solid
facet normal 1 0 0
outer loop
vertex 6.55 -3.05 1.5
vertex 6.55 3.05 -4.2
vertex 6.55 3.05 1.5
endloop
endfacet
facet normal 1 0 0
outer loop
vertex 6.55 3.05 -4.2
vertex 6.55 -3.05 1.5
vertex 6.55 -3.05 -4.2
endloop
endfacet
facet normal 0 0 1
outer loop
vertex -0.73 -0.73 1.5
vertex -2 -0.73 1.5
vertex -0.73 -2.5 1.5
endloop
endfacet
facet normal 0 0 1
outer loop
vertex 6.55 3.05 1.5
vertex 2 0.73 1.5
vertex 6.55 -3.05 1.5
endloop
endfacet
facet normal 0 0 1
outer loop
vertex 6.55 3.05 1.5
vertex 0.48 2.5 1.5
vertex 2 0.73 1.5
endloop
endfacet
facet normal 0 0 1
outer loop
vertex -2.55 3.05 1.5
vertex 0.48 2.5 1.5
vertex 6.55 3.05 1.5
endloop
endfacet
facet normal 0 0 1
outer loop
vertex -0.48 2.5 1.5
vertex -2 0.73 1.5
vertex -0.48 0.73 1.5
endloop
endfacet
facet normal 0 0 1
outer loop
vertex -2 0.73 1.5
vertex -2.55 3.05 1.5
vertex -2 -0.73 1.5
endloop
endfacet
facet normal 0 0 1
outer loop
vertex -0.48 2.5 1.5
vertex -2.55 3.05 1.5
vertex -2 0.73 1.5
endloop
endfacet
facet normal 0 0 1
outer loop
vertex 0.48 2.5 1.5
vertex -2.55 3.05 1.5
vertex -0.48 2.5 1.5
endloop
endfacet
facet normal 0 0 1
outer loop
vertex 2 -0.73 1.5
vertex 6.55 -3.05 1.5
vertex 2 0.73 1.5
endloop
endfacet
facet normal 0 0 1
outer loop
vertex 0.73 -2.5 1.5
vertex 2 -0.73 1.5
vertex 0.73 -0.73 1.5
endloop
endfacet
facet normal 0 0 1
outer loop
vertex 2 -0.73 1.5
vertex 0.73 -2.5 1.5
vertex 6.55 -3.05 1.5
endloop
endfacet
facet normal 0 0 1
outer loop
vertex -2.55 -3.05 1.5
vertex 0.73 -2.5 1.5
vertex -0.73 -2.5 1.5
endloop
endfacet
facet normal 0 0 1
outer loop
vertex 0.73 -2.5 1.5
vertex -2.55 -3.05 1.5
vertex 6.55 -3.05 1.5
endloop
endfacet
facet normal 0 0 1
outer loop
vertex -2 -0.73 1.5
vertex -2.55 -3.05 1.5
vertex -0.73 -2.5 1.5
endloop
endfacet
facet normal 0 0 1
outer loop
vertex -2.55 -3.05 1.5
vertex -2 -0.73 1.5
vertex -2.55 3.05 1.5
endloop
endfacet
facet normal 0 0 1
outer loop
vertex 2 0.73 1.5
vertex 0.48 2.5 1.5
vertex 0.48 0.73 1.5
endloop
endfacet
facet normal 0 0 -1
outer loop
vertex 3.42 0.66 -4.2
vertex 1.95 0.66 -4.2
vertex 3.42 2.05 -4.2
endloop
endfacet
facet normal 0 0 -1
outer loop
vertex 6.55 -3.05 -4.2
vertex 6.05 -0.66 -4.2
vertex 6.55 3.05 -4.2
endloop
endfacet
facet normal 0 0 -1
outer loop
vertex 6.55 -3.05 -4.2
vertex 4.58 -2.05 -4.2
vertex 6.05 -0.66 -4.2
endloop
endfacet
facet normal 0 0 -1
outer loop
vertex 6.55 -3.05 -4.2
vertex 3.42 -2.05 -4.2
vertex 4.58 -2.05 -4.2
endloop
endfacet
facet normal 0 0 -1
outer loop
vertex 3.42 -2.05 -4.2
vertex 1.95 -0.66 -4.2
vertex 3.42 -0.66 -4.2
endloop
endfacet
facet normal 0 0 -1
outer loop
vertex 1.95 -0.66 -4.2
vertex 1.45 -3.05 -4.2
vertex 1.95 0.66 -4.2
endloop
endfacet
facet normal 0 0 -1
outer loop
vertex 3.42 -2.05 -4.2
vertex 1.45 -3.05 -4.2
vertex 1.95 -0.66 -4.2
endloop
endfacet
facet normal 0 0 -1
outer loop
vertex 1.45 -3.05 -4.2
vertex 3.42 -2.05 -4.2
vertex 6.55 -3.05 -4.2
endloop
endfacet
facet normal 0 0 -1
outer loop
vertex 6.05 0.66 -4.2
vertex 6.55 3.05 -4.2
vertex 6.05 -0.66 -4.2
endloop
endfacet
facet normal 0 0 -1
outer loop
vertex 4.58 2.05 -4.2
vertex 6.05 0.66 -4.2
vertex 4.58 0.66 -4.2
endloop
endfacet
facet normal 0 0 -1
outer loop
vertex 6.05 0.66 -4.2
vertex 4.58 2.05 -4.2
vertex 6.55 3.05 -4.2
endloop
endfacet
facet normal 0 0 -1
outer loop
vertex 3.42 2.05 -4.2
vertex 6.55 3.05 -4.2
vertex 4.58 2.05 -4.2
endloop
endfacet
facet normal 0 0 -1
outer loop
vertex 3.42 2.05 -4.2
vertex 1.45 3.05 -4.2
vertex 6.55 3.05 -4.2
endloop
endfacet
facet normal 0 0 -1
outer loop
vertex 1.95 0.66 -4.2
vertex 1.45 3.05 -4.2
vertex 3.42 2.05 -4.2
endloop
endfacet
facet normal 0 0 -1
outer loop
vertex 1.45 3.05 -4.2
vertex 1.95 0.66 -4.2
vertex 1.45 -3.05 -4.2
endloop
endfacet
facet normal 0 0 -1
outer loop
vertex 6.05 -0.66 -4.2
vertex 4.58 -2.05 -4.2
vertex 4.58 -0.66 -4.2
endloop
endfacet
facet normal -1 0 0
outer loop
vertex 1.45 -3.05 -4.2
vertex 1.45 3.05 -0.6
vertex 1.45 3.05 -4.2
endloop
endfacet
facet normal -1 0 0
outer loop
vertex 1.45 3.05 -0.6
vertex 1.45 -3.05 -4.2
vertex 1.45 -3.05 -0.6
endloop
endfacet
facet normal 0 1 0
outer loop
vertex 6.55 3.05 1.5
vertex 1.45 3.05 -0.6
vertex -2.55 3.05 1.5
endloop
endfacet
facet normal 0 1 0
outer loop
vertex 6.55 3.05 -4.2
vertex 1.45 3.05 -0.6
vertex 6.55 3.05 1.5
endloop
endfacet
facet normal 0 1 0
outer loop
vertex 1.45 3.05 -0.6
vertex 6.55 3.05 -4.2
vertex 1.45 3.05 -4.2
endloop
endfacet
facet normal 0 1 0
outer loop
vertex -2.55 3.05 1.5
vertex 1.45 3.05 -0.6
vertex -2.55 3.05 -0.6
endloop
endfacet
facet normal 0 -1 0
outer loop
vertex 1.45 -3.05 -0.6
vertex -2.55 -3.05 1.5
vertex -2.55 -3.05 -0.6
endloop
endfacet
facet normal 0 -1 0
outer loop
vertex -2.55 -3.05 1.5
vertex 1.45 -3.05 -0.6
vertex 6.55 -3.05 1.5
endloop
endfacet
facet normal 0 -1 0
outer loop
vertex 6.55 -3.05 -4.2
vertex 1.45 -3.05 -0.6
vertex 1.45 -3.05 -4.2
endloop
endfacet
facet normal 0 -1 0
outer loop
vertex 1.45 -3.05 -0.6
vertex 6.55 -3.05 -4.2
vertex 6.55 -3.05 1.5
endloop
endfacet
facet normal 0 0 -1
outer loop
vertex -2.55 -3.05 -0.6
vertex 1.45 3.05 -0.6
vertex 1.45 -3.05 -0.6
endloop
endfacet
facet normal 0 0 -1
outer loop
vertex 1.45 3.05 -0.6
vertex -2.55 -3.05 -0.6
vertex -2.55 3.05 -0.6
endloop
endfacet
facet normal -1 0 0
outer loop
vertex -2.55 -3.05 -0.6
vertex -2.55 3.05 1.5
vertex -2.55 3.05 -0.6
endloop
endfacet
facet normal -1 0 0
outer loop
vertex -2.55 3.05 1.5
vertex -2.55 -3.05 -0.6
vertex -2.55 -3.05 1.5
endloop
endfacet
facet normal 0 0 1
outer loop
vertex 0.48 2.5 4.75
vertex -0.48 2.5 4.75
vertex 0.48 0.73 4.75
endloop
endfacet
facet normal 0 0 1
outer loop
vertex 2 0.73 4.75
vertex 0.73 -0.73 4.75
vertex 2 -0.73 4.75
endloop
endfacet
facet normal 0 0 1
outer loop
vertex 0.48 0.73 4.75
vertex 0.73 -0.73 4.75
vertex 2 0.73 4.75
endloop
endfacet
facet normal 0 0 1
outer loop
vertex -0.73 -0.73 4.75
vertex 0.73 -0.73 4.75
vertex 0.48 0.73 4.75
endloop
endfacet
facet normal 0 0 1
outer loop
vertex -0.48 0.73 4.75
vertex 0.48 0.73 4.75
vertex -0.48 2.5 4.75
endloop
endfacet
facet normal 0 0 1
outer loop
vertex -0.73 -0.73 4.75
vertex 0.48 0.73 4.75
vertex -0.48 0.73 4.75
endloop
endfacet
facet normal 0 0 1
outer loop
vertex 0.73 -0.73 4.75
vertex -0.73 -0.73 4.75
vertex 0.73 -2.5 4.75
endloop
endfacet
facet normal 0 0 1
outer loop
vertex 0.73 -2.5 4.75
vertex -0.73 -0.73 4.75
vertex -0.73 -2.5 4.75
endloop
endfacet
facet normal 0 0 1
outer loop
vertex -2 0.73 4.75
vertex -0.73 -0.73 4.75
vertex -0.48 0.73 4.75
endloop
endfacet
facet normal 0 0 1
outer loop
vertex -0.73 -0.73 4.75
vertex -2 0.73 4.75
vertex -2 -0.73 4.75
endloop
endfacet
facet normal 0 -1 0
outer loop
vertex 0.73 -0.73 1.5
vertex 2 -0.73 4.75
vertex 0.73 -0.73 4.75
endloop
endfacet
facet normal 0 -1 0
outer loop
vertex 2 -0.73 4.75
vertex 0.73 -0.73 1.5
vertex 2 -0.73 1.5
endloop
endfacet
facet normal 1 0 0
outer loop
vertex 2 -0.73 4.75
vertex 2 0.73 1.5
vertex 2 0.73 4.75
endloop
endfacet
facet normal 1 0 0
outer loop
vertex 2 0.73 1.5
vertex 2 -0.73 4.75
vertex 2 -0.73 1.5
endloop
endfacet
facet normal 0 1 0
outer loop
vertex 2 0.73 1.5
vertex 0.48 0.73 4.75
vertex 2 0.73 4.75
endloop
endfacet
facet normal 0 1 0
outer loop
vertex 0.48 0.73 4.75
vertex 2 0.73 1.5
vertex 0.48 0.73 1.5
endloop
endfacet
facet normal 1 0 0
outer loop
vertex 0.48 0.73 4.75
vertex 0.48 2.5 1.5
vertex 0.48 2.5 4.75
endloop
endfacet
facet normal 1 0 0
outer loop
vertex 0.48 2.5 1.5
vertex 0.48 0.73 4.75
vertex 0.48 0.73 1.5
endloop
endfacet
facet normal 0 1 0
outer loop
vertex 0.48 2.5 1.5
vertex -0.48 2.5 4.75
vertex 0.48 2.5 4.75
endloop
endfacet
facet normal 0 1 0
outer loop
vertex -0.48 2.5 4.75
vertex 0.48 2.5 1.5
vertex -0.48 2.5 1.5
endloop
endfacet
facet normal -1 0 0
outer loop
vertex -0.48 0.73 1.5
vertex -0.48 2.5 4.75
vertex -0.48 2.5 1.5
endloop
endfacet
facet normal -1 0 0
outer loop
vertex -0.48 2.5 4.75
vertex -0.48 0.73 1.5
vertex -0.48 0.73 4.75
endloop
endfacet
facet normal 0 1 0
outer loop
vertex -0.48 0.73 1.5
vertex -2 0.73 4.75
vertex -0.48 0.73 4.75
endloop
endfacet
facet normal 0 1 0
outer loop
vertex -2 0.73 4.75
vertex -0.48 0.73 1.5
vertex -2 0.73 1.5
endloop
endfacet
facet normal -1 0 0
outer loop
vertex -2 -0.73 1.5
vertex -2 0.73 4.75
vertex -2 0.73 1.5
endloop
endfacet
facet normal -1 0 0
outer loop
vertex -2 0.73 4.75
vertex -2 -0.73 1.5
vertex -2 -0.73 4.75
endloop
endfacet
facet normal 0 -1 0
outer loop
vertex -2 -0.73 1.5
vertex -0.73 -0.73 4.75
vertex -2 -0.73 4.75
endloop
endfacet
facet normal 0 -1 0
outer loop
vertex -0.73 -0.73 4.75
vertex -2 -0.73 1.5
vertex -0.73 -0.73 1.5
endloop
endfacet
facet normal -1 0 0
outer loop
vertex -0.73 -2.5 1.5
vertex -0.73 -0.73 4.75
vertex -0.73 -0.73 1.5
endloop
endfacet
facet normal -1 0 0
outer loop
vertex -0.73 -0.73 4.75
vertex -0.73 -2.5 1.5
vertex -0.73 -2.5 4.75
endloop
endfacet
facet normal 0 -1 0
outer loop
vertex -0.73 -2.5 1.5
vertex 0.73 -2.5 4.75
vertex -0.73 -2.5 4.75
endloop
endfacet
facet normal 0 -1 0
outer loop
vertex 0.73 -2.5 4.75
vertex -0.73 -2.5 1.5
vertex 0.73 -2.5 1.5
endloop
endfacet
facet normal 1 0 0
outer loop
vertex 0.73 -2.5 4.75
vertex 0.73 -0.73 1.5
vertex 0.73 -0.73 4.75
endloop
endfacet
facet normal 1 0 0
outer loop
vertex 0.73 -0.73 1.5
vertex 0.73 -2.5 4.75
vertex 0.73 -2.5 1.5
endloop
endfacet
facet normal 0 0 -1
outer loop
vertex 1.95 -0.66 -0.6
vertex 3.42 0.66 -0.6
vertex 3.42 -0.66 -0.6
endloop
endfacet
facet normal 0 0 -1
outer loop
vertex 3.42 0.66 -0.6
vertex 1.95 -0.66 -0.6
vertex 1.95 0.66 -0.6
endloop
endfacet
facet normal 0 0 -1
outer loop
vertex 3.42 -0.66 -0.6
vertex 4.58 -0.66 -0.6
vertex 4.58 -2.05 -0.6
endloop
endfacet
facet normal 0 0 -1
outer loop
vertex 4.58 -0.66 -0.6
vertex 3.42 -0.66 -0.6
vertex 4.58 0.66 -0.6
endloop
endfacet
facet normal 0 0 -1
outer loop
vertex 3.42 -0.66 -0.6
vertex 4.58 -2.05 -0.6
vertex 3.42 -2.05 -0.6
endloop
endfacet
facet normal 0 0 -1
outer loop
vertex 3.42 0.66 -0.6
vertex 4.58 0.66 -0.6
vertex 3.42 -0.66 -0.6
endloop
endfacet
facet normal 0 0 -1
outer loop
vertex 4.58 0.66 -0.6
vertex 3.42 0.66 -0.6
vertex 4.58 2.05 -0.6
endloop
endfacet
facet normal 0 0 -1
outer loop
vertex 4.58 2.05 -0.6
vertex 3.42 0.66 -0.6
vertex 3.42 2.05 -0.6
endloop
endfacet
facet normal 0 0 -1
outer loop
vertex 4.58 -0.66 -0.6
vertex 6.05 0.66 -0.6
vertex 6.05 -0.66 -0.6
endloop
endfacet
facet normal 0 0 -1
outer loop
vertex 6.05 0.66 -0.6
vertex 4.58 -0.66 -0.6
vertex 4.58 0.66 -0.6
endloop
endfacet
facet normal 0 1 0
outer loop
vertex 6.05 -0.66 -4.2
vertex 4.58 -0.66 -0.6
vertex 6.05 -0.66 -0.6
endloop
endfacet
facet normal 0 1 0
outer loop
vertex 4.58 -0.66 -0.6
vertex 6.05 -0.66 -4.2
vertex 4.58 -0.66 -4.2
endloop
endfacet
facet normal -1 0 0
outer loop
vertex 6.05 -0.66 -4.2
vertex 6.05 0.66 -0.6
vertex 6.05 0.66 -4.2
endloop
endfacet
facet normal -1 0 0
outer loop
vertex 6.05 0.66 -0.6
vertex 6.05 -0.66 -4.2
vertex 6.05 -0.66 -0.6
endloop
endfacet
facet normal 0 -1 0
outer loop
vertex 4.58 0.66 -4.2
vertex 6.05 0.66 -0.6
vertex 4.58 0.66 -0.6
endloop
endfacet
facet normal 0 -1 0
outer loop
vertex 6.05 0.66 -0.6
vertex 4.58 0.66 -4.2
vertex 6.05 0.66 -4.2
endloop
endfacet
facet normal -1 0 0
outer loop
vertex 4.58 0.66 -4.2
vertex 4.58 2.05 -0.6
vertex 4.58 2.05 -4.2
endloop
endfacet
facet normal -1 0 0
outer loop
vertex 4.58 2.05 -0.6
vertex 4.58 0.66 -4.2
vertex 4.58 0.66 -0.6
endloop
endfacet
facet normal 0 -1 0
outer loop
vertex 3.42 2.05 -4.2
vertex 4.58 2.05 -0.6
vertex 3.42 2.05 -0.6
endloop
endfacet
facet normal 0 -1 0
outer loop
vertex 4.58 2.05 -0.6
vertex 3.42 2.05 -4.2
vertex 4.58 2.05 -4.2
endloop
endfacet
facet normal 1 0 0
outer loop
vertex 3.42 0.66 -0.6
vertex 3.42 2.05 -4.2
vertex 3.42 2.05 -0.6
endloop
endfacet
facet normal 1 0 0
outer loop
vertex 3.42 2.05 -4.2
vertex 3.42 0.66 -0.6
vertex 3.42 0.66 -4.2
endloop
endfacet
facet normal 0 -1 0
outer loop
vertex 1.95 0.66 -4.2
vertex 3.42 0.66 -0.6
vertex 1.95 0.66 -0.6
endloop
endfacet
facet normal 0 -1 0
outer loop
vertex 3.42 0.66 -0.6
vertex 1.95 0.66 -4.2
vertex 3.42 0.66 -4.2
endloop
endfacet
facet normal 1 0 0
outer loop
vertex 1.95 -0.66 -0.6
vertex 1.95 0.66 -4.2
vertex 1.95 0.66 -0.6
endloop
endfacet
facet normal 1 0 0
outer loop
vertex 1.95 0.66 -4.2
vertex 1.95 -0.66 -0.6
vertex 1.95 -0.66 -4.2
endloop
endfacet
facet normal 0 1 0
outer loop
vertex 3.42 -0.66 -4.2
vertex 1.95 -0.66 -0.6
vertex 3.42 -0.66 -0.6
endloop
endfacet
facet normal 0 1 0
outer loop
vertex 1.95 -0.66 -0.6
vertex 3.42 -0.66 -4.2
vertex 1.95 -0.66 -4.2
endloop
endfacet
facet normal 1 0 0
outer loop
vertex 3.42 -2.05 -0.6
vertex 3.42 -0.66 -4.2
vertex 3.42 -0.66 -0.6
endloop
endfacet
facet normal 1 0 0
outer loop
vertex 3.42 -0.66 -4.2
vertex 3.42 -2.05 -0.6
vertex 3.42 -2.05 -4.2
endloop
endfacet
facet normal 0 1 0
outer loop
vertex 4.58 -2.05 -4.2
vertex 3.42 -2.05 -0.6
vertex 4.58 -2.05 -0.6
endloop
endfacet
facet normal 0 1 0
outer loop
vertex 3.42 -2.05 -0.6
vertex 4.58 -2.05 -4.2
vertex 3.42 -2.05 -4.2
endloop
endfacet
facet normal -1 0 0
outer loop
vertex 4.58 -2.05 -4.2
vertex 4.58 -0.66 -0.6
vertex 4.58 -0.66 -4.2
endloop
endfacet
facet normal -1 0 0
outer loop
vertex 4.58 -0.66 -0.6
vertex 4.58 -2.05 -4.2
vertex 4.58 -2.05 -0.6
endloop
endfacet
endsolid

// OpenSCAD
// Offset adapter: the C128's own (Mitsumi) spacebar on Cherry stabilizers at the standard
// MX 9u spacing.
//
// The Mitsumi bar's two stabilizer sockets are 125.35 mm apart; rev 3 drills its Cherry
// PCB-mount stabilizers 133.35 mm apart (the MX 9u spacing).  This is the
// the-c128-keyboard-project adapter (printable_parts/adapter_mitsumi_spacebar_to_cherry_
// stabilizer, by Jeff Flitton, CC-BY-SA 4.0; dimensions measured from its STL) with its MX
// socket moved `offset` mm along the bar: the plug still goes into the bar's socket, a bridge
// carries the load 4 mm outward, and the socket takes the stabilizer insert's stem there.
//
// Print two: `side = 1` for the right-hand stabilizer and `side = -1` for the left (mirror
// images: the socket always moves away from the middle of the bar).  The Makefile builds both.
//
// Coordinates as the original: z = 0 is its middle; the MX socket opens downward at
// z = -4.2, the plug points up and ends at z = 4.75.  The bar's long axis is x (`offset_axis`
// swaps it to y if a test print shows the plug's long arm should run along the bar).

side        = 1;        // 1 right stabilizer, -1 left
offset      = 4.0;      // (133.35 - 125.35) / 2
offset_axis = "x";      // "x" or "y": which way the bar runs in this part's frame
clear       = 0;        // widens the MX socket's cross slots (mm per side) if too tight

// --- the original part ----------------------------------------------------------------
body_x  = 5.1;          // block outside, x
body_y  = 6.1;          //                y
sock_z0 = -4.2;         // MX socket: open bottom ...
sock_z1 = -0.6;         //            ... to its floor (3.6 deep)
top_z   = 1.5;          // top of the block: the bar's socket post sits here
plug_z1 = 4.75;         // plug tip

// female MX cross for the stabilizer insert's stem
sock_arm_long = 4.1;    // both arms 4.1 long
sock_arm_x_w  = 1.32;   // the arm along x is 1.32 wide
sock_arm_y_w  = 1.16;   // the arm along y is 1.16 wide

// male plug into the Mitsumi bar's socket: a cross whose y arm is wider on the -y side
plug_x_len  = 4.0;      // x arm, +/-2.0
plug_x_w    = 1.46;     //        +/-0.73
plug_y_len  = 2.5;      // y arm reaches +/-2.5
plug_ym_w   = 1.46;     // -y half +/-0.73
plug_yp_w   = 0.96;     // +y half +/-0.48

eps = 0.01;

module plug() {
    translate([0, 0, top_z - eps]) linear_extrude(plug_z1 - top_z + eps) union() {
        square([plug_x_len, plug_x_w], center = true);
        translate([-plug_ym_w / 2, -plug_y_len]) square([plug_ym_w, plug_y_len]);
        translate([-plug_yp_w / 2, 0]) square([plug_yp_w, plug_y_len]);
    }
}

module socket_cross() {
    c = clear;
    translate([0, 0, sock_z0 - eps]) linear_extrude(sock_z1 - sock_z0 + eps) union() {
        square([sock_arm_long + 2 * c, sock_arm_x_w + 2 * c], center = true);
        square([sock_arm_y_w + 2 * c, sock_arm_long + 2 * c], center = true);
    }
}

module adapter() {
    d = side * offset;
    s = offset_axis == "x" ? [d, 0, 0] : [0, d, 0];
    difference() {
        union() {
            // the socket column, under the stabilizer
            translate(s) translate([-body_x / 2, -body_y / 2, sock_z0])
                cube([body_x, body_y, top_z - sock_z0]);
            // the bridge, at the old block's height: from the plug over to the column
            hull() {
                translate([-body_x / 2, -body_y / 2, sock_z1]) cube([body_x, body_y, top_z - sock_z1]);
                translate(s) translate([-body_x / 2, -body_y / 2, sock_z1])
                    cube([body_x, body_y, top_z - sock_z1]);
            }
            plug();
        }
        translate(s) socket_cross();
    }
}

adapter();
